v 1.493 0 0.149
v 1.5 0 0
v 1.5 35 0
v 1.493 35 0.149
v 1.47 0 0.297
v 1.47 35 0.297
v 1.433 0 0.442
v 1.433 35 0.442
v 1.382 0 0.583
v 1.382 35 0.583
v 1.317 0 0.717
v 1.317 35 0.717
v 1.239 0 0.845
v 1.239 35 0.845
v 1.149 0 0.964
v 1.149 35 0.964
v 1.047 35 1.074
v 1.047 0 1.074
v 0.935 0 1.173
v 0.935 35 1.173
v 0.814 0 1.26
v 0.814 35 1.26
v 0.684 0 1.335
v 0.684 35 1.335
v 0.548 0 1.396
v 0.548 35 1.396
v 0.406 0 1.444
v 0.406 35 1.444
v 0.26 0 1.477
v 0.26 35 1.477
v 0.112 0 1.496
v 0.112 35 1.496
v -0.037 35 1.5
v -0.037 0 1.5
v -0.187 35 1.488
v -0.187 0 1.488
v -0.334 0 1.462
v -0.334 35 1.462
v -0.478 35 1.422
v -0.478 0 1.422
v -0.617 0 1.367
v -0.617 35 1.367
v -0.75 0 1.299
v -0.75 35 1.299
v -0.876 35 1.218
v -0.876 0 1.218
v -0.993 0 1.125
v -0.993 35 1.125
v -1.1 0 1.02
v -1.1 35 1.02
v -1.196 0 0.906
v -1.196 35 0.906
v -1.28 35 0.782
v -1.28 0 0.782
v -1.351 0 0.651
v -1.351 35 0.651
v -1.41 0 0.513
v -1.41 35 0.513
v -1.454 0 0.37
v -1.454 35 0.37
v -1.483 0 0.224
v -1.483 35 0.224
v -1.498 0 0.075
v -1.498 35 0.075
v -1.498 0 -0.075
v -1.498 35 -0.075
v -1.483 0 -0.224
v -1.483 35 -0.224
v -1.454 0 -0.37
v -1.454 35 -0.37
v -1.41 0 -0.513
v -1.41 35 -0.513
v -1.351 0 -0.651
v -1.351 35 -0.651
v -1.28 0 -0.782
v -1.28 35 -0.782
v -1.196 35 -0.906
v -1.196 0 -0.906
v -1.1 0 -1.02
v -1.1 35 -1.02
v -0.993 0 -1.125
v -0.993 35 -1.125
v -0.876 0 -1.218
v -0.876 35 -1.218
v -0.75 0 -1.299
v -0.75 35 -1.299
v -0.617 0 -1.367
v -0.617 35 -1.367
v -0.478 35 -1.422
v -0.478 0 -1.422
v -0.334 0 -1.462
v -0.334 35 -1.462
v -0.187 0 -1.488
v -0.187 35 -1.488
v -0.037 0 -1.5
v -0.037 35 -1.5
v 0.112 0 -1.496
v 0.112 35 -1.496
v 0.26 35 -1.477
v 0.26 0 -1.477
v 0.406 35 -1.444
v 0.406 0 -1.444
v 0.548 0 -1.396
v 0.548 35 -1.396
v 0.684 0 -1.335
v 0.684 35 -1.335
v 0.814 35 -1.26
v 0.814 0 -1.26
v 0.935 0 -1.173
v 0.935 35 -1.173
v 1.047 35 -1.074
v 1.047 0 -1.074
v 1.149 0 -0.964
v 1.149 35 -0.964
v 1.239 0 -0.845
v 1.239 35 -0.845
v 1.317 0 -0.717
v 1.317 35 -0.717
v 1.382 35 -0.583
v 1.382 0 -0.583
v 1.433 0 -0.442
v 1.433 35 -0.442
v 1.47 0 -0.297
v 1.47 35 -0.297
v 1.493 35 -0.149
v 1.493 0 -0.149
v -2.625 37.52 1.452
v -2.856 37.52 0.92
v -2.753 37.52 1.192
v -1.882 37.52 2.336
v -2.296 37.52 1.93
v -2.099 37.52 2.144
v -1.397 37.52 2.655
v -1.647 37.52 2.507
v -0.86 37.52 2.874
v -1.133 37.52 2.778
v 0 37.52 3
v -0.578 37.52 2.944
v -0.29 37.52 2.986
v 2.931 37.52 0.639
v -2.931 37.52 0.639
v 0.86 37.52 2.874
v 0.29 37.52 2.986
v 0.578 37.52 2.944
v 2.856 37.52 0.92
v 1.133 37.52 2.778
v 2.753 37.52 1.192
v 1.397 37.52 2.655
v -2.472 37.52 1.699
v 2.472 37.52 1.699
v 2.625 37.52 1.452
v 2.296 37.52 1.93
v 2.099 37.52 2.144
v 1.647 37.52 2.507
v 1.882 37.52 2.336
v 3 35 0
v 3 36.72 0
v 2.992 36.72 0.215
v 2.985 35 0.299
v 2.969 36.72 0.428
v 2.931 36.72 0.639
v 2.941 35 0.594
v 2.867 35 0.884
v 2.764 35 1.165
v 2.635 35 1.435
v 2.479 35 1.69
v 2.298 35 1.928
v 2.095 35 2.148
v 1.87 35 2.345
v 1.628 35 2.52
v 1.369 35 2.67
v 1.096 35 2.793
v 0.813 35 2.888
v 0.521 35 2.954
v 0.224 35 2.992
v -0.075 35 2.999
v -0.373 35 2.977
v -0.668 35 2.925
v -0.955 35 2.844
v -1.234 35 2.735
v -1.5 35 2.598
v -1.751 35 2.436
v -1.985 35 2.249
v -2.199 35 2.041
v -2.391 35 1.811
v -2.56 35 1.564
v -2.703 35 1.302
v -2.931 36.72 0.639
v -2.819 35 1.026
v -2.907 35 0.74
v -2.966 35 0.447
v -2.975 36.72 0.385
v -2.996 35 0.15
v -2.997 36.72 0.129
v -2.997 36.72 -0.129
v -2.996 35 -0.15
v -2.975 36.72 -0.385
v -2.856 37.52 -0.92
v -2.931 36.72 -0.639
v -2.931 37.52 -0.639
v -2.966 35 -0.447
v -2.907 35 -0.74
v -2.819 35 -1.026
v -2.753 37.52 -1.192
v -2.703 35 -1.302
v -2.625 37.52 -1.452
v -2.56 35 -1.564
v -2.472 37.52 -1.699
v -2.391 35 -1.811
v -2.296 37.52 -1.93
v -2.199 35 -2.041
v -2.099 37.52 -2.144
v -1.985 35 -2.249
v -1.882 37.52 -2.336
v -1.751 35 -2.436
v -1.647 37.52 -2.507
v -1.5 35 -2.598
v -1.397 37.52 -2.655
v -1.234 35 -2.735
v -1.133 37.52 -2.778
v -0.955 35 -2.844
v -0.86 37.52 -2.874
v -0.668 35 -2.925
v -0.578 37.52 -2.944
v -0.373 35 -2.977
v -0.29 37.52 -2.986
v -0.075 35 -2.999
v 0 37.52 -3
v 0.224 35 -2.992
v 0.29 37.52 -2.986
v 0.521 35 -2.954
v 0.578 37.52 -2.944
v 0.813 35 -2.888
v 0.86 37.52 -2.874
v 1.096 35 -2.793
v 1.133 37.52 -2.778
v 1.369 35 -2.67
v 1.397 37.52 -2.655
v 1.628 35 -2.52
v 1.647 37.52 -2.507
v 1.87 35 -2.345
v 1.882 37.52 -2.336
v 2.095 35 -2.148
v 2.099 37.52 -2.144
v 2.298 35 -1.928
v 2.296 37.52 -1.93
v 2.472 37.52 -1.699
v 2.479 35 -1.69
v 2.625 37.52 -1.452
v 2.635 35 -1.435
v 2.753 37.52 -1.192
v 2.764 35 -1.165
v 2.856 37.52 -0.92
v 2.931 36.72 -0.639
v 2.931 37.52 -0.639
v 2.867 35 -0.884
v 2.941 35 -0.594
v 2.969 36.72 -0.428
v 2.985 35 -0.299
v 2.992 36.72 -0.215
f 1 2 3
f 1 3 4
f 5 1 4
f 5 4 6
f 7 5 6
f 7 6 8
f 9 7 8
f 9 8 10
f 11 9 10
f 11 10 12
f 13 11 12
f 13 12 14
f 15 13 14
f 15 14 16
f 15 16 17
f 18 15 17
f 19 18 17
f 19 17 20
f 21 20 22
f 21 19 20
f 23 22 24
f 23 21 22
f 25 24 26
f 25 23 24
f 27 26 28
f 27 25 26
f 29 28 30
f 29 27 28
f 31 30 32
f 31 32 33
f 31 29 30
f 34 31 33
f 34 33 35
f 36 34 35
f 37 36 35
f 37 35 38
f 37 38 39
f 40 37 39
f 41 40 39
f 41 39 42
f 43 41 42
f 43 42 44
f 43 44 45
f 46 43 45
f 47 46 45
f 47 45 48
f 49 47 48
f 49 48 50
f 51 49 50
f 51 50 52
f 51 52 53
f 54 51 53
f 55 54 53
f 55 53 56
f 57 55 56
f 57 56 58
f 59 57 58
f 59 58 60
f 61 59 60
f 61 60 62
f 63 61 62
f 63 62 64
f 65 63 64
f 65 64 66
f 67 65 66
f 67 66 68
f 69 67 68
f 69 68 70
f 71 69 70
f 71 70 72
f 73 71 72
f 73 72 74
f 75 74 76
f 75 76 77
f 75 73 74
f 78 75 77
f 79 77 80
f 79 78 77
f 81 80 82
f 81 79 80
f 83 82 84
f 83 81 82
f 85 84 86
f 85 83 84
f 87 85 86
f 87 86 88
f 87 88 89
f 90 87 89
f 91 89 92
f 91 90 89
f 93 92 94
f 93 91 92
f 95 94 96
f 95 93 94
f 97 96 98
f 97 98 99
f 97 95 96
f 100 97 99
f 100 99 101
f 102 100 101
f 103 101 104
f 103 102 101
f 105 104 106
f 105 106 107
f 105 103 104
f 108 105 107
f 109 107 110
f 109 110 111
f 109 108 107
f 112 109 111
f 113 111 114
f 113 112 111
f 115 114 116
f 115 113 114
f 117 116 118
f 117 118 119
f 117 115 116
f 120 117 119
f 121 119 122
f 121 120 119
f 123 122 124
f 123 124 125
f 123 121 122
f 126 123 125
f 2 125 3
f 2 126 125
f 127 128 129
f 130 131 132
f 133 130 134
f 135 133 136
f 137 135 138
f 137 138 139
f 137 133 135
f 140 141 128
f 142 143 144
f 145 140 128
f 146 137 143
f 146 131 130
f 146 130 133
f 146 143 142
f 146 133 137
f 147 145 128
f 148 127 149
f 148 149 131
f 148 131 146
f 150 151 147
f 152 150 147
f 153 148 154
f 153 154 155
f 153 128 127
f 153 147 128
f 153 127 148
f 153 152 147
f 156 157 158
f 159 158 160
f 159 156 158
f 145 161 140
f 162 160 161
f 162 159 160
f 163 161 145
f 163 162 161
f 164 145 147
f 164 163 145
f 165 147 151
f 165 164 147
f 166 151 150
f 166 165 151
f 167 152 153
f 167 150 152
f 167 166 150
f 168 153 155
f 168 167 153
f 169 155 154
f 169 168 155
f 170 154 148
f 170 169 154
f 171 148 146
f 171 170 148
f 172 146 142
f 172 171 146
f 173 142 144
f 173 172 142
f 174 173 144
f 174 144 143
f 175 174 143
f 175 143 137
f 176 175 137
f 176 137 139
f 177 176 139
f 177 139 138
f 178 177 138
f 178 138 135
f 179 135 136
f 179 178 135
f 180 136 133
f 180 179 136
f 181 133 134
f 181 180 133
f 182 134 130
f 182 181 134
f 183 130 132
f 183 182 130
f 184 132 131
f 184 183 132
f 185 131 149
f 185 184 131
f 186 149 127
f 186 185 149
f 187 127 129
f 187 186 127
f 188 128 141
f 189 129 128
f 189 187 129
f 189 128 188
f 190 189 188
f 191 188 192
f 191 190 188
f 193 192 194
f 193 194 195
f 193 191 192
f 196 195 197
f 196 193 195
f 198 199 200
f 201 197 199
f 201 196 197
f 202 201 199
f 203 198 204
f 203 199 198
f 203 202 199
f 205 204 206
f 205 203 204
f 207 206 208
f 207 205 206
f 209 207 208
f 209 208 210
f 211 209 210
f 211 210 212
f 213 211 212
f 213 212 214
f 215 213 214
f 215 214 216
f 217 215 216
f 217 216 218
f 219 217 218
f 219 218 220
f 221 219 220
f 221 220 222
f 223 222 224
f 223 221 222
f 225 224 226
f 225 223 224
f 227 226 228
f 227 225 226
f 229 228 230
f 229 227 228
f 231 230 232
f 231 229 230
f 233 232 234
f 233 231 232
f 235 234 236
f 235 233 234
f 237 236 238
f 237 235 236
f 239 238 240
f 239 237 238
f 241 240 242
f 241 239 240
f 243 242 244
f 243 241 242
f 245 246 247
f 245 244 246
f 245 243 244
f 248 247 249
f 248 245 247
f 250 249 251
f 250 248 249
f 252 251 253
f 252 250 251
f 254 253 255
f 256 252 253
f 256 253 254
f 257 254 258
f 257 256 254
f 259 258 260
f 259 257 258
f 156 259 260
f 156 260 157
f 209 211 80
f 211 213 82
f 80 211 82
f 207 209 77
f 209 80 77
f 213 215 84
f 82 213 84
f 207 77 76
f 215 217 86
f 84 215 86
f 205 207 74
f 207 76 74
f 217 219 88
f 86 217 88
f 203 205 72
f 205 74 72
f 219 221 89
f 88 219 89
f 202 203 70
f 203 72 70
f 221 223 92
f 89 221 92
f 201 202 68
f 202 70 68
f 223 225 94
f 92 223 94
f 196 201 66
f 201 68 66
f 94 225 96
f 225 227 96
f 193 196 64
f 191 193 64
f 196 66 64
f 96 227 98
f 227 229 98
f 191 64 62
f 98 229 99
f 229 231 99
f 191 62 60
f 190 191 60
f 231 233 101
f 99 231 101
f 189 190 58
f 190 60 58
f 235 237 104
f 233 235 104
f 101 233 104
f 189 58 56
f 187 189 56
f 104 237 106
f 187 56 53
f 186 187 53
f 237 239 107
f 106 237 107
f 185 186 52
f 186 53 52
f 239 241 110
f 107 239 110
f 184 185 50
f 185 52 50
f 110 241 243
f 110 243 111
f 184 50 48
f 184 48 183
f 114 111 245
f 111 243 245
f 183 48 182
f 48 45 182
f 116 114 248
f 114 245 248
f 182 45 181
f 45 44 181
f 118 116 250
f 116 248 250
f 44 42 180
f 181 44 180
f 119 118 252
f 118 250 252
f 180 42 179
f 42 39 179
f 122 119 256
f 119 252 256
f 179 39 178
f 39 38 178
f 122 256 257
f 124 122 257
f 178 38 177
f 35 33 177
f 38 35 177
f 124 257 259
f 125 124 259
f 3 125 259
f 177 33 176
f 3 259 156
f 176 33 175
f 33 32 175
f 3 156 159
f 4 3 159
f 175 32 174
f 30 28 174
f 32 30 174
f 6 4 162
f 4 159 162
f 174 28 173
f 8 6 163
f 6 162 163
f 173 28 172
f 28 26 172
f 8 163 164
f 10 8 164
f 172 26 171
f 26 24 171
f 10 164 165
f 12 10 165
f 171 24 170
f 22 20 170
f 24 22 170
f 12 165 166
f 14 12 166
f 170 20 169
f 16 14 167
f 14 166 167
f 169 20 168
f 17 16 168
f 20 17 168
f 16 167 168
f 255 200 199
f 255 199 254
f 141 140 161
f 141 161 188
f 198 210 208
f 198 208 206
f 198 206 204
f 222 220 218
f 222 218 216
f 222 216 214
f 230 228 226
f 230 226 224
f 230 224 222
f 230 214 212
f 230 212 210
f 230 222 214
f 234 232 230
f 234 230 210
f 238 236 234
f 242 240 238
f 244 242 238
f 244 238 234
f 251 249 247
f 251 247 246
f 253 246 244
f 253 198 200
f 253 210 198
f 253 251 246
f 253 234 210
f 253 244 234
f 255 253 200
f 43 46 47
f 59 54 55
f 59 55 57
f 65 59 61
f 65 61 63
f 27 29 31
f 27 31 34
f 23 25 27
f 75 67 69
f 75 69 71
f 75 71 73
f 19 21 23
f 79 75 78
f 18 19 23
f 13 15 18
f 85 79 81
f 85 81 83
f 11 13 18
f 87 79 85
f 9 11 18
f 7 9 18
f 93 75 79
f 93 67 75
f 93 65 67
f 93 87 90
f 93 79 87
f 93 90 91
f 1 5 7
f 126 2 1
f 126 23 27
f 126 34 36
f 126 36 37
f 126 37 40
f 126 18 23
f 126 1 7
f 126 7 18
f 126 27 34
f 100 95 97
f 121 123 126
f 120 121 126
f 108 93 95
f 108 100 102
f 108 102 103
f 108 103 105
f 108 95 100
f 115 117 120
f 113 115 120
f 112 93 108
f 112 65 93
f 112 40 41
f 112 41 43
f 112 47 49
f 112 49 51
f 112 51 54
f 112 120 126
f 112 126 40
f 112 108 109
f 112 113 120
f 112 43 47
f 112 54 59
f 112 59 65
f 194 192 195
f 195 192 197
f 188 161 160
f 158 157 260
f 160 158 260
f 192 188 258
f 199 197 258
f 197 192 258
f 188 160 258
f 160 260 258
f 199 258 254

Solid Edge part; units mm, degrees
sketch "Sketch1" plane through (0, 0, 0) normal (0, -1, 0) x (1, 0, 0)
  circle A0 centre (0, 0) radius 1.5
extrude "Protrusion1" add sketch "Sketch1" against normal blind 35
sketch "Sketch2" plane through (0, 35, 0) normal (0, 1, 0) x (1, 0, 0)
  circle A0 centre (0, 0) radius 3
extrude "ExtrudedProtrusion_2" add sketch "Sketch2" along normal blind 2.52
sketch "Sketch3" plane through (0, 37.52, 0) normal (0, 1, 0) x (-1, 0, 0)
  line L0 (-2.9311, 0.6393) -> (2.9311, 0.6393)
  arc A0 (2.9311, 0.6393) -> (2.9311, -0.6393) centre (0, 0) cw
  line L1 (2.9311, -0.6393) -> (-2.9311, -0.6393)
  arc A1 (-2.9311, -0.6393) -> (-2.9311, 0.6393) centre (0, 0) cw
extrude "ExtrudedCutout_1" cut sketch "Sketch3" against normal blind 0.8
cosmetic_thread "Thread1" size "M3"
properties material "Nylon, general purpose"
